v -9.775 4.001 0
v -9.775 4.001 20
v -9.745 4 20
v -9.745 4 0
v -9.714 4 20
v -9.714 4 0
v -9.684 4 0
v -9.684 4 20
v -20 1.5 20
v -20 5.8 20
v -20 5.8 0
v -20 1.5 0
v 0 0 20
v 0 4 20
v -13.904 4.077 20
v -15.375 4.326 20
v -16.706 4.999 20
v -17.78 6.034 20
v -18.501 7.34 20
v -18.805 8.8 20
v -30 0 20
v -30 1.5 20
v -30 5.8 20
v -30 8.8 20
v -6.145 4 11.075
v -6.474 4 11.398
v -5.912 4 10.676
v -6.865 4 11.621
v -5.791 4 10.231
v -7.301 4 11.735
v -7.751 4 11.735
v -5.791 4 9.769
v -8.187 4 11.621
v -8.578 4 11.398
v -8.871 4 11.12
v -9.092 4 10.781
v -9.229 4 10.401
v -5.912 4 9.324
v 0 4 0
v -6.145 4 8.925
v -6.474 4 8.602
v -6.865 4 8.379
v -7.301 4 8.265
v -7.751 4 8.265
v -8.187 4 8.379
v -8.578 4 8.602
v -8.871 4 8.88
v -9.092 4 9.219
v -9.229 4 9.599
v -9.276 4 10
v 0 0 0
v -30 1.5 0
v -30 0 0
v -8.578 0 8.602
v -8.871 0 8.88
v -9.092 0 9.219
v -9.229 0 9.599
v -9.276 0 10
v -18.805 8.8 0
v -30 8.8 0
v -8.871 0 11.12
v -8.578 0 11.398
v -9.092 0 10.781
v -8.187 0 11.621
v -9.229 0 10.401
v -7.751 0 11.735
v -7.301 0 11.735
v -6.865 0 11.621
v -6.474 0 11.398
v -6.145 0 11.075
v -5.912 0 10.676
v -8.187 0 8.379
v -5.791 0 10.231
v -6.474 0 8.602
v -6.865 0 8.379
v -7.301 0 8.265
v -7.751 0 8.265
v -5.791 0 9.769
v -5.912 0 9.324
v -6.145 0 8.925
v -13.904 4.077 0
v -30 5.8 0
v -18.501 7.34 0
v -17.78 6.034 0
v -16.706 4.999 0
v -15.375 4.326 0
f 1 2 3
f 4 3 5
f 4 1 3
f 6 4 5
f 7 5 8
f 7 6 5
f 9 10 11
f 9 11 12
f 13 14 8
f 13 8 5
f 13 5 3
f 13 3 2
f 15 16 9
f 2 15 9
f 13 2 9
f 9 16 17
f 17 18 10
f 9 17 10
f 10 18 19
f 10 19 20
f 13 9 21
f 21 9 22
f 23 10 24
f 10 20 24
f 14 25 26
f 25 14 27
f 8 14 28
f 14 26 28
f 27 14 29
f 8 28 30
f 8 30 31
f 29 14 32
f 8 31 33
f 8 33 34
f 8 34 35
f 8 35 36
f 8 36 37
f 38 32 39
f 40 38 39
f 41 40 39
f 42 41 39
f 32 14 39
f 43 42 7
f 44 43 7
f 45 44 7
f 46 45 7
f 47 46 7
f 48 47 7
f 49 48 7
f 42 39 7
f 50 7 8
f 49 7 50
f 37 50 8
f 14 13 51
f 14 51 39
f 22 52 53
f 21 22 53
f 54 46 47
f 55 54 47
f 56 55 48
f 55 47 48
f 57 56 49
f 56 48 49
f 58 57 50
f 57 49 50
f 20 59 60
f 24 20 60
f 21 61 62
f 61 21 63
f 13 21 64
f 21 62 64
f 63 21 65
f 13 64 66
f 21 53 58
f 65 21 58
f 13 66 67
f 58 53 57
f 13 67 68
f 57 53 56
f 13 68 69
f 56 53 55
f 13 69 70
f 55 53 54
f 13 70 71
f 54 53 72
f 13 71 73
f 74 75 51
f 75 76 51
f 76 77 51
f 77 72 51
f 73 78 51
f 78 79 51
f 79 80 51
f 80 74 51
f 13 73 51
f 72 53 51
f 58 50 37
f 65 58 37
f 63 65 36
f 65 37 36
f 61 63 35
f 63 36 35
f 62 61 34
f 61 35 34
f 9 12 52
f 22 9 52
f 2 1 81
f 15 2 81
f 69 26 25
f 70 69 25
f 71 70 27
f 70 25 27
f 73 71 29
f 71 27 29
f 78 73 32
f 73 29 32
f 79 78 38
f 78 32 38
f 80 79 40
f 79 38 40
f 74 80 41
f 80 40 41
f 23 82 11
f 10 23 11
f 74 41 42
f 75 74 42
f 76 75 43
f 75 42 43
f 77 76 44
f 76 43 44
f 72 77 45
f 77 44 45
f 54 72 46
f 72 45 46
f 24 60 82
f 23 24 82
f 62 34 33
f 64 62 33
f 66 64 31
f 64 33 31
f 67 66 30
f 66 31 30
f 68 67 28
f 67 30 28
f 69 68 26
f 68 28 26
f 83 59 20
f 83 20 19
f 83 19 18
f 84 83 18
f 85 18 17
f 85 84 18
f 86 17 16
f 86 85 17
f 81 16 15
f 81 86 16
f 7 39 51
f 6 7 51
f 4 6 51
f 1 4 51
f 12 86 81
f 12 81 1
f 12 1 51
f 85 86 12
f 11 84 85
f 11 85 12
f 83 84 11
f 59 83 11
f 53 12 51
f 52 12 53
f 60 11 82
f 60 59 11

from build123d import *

# Parameters (mm, degrees)
F1_DEPTH    = 20
F2_T1_DEPTH = 20
F4_DEPTH    = 25


# Not quite as in the source:
# - a fillet or chamfer that OpenCascade refuses, or shapes differently, is made with other operations: its cross-section is extruded or revolved along the edge and cut away or added


with BuildPart() as f1:
    # F0 (on Top) → F1 (new body)
    with BuildSketch(Plane.XY):
        Polygon((-30, 0), (0, 0), (0, 1.4936865721), (0, 2.9873731442), (0, 4), (-9.7294932483, 4), (-18.8047308475, 4.1669379548), (-18.8047308475, 8.8), (-30, 8.8), (-30, 5.8), (-20, 5.8), (-20, 1.5), (-30, 1.5), align=None)
    extrude(amount=F1_DEPTH)

    # F2: fillet of radius 5 on 2 edges, made by hand

    # F2_s2 → F2_t1 (join)
    with BuildSketch(Plane.XY):
        with BuildLine():
            ThreePointArc((-9.7754687943, 4.0008457149), (-9.7294913038, 4.0002114332), (-9.6835099246, 4))
            Line((-9.6835099246, 4), (-9.7294932483, 4))
            Line((-9.7294932483, 4), (-9.7754687943, 4.0008457149))
        make_face()
        with BuildLine():
            ThreePointArc((-18.8047308475, 8.8), (-17.2821914607, 5.4759203381), (-13.904310341, 4.0767952816))
            Line((-13.904310341, 4.0767952816), (-18.8047308475, 4.1669379548))
            Line((-18.8047308475, 4.1669379548), (-18.8047308475, 8.8))
        make_face()
    extrude(amount=F2_T1_DEPTH)

    # F3 (on face) → F4 (cut)
    with BuildSketch(Plane(origin=(0, 4, 0), x_dir=(-1, 0, 0), z_dir=(0, 1, 0))):
        with BuildLine():
            Line((6.4737138013, 11.3982501667), (7.5260428712, 10))
            Line((7.5260428712, 10), (8.5783719411, 11.3982501667))
            ThreePointArc((8.5783719411, 11.3982501667), (7.5260428712, 11.75), (6.4737138013, 11.3982501667))
        make_face()
        with BuildLine():
            ThreePointArc((6.4737138013, 11.3982501667), (5.7760428712, 10), (6.4737138013, 8.6017498333))
            Line((6.4737138013, 8.6017498333), (7.5260428712, 10))
            Line((7.5260428712, 10), (6.4737138013, 11.3982501667))
        make_face()
        with BuildLine():
            Line((7.5260428712, 10), (6.4737138013, 8.6017498333))
            ThreePointArc((6.4737138013, 8.6017498333), (7.5260428712, 8.25), (8.5783719411, 8.6017498333))
            Line((8.5783719411, 8.6017498333), (7.5260428712, 10))
        make_face()
        with BuildLine():
            Line((8.5783719411, 11.3982501667), (7.5260428712, 10))
            Line((7.5260428712, 10), (8.5783719411, 8.6017498333))
            ThreePointArc((8.5783719411, 8.6017498333), (9.0919413149, 9.2186792823), (9.2760428712, 10))
            ThreePointArc((9.2760428712, 10), (9.0919413149, 10.7813207177), (8.5783719411, 11.3982501667))
        make_face()
    extrude(amount=-F4_DEPTH, mode=Mode.SUBTRACT)


solid = f1.part
